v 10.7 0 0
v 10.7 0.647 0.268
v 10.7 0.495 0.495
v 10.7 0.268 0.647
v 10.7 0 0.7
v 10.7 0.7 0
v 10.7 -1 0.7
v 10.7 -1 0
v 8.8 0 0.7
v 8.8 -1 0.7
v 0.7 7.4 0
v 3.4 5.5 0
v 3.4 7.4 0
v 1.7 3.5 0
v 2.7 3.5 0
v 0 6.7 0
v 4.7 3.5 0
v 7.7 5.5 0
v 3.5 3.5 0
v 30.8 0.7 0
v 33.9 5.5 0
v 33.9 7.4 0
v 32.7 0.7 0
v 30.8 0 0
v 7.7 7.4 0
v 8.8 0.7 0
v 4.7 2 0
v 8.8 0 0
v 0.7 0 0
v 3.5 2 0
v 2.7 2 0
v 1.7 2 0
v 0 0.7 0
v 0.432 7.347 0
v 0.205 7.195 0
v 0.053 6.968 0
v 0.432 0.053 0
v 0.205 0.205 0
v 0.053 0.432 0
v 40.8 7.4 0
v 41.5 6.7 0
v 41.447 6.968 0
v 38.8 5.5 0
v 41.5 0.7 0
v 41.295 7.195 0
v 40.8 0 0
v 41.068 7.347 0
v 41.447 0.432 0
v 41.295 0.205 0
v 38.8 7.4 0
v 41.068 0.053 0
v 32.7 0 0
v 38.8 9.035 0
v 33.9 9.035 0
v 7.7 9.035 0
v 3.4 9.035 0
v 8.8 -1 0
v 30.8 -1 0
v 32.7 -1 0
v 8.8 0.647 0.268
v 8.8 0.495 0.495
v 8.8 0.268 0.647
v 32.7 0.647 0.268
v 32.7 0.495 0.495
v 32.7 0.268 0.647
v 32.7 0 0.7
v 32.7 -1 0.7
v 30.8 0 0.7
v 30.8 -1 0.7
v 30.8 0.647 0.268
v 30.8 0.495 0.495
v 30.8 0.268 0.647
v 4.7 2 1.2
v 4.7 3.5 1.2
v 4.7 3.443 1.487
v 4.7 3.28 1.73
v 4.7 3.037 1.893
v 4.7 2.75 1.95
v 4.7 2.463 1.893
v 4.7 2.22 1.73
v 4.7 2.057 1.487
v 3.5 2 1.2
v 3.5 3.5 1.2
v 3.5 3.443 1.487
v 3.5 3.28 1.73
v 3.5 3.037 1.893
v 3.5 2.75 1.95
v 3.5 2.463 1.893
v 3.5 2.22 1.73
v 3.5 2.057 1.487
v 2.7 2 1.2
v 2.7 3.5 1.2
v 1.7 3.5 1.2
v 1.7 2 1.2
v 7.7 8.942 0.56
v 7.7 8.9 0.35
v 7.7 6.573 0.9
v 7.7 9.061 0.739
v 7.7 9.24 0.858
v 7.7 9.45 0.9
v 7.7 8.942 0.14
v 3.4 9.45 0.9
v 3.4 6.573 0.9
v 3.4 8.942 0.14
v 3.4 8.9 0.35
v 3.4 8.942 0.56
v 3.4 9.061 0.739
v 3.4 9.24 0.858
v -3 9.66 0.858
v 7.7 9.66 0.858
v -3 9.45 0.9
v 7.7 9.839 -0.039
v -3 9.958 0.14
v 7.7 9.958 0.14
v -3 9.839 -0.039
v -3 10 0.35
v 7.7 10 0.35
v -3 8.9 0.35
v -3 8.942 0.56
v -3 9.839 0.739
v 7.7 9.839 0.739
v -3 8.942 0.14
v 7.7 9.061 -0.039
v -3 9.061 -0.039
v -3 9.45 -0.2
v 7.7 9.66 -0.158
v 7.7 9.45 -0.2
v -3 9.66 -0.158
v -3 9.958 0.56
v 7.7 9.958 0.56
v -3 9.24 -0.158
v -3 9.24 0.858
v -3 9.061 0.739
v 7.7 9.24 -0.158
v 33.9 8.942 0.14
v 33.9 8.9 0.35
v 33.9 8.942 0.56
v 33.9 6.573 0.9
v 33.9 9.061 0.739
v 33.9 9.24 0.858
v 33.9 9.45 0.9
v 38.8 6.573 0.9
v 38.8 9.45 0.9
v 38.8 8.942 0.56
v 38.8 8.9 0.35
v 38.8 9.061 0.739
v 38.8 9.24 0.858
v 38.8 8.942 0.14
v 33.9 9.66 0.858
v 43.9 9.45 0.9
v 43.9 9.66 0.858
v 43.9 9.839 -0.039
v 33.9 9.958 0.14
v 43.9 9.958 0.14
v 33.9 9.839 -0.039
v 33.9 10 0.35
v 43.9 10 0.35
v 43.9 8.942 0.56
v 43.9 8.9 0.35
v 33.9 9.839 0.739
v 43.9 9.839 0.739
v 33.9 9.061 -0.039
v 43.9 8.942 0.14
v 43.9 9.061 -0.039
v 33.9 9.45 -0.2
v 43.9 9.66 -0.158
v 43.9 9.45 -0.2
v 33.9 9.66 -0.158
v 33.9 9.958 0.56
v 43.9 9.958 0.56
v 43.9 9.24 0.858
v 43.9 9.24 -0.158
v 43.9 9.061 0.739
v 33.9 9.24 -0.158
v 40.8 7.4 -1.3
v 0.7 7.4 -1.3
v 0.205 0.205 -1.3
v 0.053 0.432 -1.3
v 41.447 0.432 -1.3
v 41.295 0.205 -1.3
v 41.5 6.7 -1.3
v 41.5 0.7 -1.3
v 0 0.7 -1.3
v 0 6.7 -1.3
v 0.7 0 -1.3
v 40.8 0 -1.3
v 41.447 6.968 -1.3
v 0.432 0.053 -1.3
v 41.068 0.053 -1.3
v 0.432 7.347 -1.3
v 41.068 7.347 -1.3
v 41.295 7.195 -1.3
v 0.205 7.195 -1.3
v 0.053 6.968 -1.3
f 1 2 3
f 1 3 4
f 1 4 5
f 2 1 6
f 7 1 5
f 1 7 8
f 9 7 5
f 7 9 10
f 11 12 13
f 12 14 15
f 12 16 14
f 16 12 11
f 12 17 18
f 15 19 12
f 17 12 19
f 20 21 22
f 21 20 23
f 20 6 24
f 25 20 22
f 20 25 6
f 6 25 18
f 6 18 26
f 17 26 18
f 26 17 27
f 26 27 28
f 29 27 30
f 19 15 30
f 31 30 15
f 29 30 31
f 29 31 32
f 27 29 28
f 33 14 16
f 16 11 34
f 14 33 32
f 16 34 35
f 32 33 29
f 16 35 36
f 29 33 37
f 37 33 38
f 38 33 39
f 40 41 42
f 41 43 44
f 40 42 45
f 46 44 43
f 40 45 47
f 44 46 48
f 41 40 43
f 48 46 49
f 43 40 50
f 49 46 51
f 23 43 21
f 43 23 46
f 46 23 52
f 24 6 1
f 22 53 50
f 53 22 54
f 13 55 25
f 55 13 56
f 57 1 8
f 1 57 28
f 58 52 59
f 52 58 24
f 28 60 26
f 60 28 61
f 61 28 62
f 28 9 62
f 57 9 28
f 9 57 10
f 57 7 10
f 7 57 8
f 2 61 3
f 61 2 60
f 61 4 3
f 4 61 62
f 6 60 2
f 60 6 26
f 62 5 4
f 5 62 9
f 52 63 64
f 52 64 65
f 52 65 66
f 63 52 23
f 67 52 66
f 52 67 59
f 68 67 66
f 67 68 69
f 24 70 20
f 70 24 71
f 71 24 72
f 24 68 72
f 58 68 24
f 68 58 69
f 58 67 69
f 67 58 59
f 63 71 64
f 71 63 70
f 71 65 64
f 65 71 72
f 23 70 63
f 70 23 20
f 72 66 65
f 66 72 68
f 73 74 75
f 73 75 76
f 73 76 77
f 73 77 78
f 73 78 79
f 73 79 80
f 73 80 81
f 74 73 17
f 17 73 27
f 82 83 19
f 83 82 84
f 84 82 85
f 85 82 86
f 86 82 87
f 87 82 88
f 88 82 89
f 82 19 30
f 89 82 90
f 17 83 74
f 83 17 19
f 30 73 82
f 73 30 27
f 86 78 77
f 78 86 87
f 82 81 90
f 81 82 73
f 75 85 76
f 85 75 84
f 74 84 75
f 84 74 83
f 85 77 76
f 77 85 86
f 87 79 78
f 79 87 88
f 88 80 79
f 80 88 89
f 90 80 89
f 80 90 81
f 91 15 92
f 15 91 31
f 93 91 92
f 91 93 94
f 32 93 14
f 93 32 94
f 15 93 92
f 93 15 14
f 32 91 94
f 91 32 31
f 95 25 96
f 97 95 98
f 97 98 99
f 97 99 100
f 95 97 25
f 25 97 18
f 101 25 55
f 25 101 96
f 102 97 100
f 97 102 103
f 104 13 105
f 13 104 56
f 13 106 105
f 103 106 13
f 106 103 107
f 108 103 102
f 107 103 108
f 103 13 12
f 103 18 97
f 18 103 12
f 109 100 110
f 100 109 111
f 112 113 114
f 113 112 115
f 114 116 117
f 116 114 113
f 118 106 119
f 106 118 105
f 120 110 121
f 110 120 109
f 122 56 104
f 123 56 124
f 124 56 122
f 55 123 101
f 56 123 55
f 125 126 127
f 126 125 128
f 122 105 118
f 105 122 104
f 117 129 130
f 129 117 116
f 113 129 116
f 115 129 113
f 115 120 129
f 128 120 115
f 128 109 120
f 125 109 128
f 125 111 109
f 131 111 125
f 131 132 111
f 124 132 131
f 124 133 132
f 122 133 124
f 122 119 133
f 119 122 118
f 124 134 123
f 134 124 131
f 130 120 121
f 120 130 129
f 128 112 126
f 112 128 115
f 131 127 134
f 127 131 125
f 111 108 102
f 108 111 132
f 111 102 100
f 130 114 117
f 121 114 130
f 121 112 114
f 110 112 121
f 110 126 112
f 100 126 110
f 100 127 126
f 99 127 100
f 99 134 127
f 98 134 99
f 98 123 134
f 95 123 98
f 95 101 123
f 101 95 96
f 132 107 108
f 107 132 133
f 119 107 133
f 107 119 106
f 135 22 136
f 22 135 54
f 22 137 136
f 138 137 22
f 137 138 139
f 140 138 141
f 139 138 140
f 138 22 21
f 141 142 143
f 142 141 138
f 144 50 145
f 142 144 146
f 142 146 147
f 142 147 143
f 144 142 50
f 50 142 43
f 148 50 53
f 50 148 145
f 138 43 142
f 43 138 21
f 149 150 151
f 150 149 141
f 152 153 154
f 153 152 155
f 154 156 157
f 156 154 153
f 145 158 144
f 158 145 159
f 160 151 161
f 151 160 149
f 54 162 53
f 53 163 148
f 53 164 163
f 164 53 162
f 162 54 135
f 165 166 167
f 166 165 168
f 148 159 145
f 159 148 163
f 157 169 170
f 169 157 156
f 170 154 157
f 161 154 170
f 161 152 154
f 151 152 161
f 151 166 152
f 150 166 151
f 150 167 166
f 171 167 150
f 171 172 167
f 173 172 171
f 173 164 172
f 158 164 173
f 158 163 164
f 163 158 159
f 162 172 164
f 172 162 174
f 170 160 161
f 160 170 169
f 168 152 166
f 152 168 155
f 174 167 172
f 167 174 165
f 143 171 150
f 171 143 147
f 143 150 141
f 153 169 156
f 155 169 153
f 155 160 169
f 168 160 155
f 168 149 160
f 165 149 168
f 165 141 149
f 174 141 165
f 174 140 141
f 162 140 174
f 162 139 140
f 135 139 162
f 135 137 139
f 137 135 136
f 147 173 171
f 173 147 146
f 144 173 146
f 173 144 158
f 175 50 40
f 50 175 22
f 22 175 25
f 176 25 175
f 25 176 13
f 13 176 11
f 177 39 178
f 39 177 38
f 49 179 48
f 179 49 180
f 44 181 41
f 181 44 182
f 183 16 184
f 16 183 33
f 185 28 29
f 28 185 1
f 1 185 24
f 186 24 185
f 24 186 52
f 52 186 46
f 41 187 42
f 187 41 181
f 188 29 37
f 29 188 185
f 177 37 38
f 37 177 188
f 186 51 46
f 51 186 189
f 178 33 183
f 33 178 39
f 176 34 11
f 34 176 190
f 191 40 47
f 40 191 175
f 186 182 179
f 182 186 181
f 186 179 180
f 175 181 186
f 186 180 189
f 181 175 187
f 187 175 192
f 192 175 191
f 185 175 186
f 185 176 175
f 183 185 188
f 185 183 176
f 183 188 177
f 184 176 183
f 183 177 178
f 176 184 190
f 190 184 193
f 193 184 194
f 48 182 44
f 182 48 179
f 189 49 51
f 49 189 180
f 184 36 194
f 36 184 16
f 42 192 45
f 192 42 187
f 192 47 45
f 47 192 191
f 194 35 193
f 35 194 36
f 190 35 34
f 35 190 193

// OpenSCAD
$fn=16;

HACK=0.001;

body = [ 41.5, 7.4, 1.3 ];

body_rounding = 0.7;

module main_body() {
  r = body_rounding;
  i_w = body[0] - r*2;
  i_h = body[1] - r*2;
  d = body[2];
  
  translate([0,0,-d])
  hull() {
    translate([r, r, 0])
    cylinder(r=r, h=d);
    
    translate([i_w+r, r, 0])
    cylinder(r=r, h=d);
  
    translate([r, i_h+r, 0])
    cylinder(r=r, h=d);
    
    translate([i_w+r, i_h+r, 0])
    cylinder(r=r, h=d);  
    
  }
  
}

module stopper() {
  d = 0.7;
  w = 1.9;
  h = 1.7;
  
  difference() {
    union() {
      cube([w, h - d, d]);
      
      translate([0, h-d, 0])
        rotate([0, 90, 0])
          cylinder(r=d, h=w);
    }
    
    translate([-HACK,-HACK,-d-HACK])
      cube([w+2*HACK, h+HACK, d+HACK]);
  }
}

module spring_guides() {
  h = 1.5;
  d = 1.2;
  w1 = 1;
  w2 = 1.2;
  
  cube([w1, h, d]);
  
  translate([3 - (w2), 0, 0]) {
    cube([w2, h, d]);
    
    translate([0, (h/2), d])
      rotate([0, 90, 0])
      cylinder(d=h, h=w2);
  }
}


hinge_diam = 1.1;

module hinge(hinge_w = 10.7, mount_w = 4.3) {
  
  total_h = 4.5;
  
  
  mount_h = total_h - hinge_diam/2;
  mount_d = 0.9;
  
  
  translate([0, 0, (mount_d-hinge_diam/2)])
    rotate([0, 90, 0])
    cylinder(d=hinge_diam, h=hinge_w);
  
  
  translate([(hinge_w - mount_w), -mount_h, 0]) {
    difference() {
      cube([mount_w, mount_h, mount_d]);
  
      // chamfer
      translate([-HACK, 0, 0])
      rotate([40, 0, 0])
        cube(mount_w+2*HACK);
    }
  }
  
}


module memory_card_door() {
  hinge_to_bottom = 10;
  
  main_body();
  
  translate([8.8, -1, 0])
    stopper();
  
  translate([30.8, -1, 0])
    stopper();
  
  translate([1.7, 2, 0])
    spring_guides();
  
  translate([-3, (hinge_to_bottom - hinge_diam/2), 0])
    hinge(hinge_w = 10.7, mount_w = 4.3);
  
  translate([body[0] + 2.4, (hinge_to_bottom - hinge_diam/2), 0])
    mirror([1, 0, 0])
      hinge(hinge_w = 10, mount_w = 4.9);
}

memory_card_door();
